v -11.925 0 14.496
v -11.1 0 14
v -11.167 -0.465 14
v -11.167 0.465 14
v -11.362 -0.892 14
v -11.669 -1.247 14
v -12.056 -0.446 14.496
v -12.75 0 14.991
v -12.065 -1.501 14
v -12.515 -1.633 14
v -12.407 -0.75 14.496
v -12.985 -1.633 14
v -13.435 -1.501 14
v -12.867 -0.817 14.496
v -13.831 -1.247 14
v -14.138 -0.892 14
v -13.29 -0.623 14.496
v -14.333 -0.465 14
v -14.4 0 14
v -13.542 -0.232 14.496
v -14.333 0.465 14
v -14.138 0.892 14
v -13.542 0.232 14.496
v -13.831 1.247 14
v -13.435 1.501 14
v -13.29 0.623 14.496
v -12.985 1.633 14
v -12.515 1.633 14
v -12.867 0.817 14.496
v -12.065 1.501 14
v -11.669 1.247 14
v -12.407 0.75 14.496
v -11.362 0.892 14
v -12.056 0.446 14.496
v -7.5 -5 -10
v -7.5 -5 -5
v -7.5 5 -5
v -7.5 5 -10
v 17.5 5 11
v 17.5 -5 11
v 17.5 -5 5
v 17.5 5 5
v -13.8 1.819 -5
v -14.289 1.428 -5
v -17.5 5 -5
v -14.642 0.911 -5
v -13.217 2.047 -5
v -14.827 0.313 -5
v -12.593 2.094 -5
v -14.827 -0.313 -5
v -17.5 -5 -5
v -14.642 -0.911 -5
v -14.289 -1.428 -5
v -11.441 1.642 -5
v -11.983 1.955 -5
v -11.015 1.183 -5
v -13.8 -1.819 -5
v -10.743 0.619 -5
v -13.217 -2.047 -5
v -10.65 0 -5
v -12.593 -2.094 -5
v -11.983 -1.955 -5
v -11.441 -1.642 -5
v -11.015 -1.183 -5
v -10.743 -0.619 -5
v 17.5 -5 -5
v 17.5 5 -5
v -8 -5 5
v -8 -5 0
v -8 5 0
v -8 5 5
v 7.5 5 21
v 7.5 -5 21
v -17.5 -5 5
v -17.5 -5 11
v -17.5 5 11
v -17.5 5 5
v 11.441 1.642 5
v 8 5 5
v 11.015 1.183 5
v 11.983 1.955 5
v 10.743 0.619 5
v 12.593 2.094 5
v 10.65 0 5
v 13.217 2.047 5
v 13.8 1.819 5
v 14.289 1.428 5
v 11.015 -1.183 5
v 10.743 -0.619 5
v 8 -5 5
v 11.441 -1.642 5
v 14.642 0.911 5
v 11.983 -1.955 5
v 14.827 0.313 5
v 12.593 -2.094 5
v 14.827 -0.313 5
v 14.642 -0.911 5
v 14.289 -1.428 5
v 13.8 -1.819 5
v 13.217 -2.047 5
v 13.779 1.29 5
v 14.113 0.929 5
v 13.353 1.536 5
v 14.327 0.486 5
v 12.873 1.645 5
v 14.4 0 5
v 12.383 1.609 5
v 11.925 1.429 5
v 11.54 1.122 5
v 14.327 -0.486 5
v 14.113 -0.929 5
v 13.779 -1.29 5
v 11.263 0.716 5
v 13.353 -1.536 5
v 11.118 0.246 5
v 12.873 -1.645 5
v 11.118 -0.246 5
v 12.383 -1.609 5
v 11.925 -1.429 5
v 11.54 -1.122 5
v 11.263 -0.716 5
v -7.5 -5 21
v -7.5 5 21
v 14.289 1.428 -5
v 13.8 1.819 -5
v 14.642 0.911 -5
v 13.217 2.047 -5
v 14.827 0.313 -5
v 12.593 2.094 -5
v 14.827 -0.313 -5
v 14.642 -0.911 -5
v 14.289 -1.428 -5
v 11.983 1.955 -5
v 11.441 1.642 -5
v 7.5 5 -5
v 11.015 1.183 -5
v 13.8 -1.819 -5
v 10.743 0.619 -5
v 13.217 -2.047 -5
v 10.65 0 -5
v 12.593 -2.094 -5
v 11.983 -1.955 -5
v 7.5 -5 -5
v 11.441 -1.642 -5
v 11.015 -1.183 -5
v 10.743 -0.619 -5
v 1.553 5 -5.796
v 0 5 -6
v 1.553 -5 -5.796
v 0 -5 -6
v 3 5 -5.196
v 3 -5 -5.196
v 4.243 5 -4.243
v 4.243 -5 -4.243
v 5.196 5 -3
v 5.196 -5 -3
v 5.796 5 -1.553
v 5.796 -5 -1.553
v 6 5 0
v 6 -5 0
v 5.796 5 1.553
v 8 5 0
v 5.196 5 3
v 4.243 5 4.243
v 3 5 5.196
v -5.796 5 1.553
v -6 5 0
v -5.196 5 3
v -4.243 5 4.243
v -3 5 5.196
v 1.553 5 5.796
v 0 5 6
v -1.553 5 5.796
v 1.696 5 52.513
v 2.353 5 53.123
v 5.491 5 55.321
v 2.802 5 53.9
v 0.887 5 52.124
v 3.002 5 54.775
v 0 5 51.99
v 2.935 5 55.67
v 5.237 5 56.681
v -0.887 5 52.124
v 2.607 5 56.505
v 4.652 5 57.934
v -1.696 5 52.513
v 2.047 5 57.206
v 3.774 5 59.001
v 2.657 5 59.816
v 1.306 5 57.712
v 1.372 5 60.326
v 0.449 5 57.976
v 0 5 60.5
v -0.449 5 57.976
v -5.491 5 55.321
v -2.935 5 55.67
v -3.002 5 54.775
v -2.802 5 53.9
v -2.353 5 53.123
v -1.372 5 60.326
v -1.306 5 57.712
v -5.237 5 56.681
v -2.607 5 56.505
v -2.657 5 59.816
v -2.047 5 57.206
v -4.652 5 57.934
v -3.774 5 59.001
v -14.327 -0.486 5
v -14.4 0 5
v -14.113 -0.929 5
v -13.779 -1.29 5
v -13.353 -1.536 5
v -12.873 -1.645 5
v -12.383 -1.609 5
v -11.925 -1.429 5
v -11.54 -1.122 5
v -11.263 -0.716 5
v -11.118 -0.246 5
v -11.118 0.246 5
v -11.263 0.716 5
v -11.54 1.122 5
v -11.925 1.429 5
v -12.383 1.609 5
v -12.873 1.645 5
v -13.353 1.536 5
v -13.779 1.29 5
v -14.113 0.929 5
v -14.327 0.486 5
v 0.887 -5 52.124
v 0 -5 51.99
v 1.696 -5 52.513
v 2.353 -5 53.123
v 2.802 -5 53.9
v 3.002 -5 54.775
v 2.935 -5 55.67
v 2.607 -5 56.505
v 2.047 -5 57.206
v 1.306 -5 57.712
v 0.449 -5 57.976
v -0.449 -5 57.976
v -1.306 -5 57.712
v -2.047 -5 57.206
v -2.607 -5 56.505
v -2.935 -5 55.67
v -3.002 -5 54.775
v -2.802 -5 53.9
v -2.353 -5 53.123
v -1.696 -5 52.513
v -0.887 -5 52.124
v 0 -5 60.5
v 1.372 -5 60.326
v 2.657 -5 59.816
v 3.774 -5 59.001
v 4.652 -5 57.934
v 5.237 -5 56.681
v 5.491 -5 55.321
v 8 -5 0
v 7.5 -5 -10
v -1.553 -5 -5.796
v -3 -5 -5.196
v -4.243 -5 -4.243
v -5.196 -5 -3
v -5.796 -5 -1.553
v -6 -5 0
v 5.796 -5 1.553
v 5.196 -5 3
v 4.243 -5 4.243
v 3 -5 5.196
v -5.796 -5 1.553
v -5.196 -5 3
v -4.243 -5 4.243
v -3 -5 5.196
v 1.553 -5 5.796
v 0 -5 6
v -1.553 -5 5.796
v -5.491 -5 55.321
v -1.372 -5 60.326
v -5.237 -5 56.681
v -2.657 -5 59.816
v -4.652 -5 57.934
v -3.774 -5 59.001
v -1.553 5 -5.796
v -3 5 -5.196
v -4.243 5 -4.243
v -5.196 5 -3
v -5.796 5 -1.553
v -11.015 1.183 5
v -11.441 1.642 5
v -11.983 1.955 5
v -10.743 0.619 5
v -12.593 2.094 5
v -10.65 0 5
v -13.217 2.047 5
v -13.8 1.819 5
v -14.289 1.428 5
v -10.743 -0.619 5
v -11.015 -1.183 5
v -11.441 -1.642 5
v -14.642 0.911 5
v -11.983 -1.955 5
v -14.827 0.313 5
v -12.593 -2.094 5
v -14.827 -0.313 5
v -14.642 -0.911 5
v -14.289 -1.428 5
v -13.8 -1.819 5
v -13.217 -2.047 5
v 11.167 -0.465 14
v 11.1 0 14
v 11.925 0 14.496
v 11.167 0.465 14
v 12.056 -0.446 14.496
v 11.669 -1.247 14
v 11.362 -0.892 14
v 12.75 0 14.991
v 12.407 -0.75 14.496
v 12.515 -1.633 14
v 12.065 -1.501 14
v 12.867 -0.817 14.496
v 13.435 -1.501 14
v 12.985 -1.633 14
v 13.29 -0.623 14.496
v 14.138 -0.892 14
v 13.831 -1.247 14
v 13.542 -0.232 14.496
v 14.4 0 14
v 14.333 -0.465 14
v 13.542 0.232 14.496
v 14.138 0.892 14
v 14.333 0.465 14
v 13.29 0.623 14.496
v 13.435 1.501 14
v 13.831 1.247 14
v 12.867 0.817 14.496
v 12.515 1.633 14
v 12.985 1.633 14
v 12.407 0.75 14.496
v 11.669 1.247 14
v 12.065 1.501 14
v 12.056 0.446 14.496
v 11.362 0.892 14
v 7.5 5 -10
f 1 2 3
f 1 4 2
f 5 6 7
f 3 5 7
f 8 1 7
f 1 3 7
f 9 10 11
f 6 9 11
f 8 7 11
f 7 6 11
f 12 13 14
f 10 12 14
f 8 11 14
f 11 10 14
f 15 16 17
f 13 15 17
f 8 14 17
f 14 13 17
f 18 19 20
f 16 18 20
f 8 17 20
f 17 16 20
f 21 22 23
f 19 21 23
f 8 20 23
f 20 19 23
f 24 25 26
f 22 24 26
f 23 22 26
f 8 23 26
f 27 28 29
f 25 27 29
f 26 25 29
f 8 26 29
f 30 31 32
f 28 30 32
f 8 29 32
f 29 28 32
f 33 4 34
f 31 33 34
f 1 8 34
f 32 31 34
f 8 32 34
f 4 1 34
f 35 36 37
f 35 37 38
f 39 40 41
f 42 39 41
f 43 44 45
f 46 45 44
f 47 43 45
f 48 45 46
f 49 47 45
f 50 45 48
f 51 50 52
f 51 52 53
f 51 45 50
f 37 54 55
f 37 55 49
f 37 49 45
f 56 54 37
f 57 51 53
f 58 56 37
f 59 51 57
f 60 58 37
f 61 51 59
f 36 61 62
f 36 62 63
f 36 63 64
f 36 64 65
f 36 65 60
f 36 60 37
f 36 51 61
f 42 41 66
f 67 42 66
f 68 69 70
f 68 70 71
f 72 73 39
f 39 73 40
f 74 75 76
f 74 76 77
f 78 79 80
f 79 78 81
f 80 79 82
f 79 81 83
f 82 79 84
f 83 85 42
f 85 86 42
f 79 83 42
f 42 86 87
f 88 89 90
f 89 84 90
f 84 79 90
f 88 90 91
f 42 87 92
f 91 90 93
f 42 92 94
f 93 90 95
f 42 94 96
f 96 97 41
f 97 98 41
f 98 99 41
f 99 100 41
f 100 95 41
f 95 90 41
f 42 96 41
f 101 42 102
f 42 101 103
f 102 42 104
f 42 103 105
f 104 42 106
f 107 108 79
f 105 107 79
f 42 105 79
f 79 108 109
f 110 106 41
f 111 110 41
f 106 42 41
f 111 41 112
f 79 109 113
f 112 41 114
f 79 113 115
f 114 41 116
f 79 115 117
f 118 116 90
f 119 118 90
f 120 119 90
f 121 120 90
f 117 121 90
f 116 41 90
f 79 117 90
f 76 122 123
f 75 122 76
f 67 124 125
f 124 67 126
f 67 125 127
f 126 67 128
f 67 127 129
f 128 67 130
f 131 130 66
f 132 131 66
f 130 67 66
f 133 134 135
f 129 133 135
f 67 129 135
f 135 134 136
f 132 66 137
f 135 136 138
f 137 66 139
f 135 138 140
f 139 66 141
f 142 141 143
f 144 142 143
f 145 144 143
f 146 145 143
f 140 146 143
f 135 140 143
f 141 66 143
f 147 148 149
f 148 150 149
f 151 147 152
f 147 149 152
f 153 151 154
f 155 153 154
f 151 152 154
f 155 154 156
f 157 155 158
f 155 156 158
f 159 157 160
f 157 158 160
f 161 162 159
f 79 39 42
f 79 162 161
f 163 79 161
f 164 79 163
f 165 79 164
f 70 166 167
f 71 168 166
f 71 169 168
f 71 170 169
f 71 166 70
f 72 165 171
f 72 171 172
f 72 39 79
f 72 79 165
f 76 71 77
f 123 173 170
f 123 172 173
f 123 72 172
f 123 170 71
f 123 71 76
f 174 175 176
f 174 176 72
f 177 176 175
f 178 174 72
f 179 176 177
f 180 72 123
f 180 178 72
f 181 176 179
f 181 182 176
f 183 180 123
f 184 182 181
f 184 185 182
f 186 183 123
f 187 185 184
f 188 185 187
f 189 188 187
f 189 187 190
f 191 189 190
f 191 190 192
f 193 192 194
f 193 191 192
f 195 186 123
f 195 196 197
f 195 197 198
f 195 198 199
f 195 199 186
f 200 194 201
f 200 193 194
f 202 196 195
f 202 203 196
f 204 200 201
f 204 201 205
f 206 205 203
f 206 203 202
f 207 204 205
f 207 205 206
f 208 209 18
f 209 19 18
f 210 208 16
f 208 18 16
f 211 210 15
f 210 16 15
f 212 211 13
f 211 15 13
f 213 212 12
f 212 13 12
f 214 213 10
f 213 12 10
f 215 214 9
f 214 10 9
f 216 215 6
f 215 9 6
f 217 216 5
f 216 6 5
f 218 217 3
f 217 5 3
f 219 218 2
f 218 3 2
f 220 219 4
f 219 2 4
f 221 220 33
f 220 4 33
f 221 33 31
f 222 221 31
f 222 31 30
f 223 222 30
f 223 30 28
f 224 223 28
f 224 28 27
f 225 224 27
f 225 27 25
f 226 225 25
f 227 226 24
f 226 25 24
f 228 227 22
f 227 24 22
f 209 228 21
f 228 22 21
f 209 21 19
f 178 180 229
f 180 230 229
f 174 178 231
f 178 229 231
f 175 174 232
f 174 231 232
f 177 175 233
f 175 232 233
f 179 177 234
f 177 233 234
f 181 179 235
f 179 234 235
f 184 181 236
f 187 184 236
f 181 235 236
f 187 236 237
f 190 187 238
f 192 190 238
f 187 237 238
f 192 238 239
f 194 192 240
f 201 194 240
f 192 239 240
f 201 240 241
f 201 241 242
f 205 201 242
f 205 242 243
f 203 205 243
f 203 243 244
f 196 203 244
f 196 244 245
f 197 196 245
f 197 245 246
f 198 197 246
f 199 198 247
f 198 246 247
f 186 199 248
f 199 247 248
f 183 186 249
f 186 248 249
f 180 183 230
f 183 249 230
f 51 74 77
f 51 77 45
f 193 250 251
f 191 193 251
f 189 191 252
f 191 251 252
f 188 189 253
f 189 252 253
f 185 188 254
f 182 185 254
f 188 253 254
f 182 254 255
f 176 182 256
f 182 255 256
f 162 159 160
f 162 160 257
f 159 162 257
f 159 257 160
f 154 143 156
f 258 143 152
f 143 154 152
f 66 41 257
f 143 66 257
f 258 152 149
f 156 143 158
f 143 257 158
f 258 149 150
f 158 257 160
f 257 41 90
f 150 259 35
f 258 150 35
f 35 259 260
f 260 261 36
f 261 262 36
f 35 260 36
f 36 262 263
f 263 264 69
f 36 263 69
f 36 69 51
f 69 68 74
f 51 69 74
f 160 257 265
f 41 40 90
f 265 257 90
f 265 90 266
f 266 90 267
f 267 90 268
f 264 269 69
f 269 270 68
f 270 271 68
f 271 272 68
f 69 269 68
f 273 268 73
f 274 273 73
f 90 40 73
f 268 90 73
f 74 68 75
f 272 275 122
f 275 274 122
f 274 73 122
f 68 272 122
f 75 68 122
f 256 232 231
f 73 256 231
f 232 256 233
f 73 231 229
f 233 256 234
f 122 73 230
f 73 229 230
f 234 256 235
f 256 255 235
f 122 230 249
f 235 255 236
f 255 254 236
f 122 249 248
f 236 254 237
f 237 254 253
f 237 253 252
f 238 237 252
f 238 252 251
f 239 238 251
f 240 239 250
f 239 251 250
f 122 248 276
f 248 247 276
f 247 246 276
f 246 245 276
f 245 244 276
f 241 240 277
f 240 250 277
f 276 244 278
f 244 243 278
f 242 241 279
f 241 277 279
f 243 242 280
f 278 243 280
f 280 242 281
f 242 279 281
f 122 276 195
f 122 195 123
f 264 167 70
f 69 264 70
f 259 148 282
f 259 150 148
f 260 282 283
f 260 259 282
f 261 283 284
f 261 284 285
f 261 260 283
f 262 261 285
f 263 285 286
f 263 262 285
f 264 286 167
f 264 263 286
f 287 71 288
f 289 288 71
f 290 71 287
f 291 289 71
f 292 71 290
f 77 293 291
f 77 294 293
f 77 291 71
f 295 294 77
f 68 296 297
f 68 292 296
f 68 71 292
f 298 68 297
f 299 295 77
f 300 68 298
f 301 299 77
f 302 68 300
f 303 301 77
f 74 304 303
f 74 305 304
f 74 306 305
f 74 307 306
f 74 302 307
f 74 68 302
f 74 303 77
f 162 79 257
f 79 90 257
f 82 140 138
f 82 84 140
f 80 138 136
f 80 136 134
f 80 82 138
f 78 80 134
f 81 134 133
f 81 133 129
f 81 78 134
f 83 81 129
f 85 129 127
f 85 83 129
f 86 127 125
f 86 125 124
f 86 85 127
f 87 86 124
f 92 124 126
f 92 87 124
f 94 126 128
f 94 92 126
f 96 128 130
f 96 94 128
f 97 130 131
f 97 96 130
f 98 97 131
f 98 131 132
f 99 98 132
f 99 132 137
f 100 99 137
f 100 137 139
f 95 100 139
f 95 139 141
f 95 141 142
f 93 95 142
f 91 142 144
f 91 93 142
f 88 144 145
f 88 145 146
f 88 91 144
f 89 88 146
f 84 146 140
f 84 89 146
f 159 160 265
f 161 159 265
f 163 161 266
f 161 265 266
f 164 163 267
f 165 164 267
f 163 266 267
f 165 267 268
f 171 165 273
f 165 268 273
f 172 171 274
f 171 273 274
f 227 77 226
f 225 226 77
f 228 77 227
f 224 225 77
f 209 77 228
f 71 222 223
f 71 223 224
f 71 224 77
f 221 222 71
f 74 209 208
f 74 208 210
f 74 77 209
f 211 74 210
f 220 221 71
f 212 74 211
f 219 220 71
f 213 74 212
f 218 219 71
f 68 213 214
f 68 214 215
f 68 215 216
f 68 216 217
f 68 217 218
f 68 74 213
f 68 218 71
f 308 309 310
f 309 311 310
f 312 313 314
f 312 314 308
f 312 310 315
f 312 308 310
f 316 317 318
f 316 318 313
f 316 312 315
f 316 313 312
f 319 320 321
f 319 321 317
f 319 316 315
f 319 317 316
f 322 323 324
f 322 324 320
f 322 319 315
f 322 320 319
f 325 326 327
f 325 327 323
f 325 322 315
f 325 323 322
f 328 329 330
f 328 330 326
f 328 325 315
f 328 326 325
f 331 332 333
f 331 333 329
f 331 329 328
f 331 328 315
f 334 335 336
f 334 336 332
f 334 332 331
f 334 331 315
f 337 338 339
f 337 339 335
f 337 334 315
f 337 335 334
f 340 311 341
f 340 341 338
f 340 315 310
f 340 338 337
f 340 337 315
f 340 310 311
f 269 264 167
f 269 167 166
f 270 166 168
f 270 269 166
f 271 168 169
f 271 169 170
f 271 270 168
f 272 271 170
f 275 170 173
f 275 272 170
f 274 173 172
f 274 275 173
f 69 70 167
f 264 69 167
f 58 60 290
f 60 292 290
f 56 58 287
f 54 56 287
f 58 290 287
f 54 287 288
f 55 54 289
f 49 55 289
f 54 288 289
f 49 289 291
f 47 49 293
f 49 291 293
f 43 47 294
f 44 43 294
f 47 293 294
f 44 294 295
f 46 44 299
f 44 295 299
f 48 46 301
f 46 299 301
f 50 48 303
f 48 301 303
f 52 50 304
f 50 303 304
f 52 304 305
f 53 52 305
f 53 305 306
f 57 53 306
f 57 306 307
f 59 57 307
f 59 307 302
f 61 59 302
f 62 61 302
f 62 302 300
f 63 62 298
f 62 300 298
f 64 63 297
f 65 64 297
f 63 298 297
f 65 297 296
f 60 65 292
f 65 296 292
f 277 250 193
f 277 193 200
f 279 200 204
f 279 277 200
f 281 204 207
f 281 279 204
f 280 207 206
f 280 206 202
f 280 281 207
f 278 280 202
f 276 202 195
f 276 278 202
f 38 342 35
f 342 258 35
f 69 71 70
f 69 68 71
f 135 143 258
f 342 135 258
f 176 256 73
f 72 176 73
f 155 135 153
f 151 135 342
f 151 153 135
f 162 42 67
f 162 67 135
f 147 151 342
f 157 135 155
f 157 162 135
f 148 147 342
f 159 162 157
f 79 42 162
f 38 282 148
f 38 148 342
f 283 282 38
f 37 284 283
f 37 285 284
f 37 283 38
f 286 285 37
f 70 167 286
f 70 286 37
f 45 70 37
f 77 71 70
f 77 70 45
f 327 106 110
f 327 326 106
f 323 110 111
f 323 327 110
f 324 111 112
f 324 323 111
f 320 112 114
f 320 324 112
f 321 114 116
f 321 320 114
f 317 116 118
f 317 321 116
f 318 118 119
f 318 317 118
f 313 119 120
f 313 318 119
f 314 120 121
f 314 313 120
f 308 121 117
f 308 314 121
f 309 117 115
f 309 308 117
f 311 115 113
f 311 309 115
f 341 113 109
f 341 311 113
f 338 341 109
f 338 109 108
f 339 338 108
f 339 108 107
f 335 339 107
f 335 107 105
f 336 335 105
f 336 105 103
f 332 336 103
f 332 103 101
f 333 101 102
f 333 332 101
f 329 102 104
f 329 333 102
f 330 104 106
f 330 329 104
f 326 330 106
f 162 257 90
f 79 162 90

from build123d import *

# Parameters (mm, degrees)
F1_DEPTH      = 5
F2_R          = 2.1
F3_DEPTH      = 12.5
F6_DEPTH      = 5
F6_DEPTH_BACK = 5
F8_D          = 3.3
F8_DEPTH      = 9
F8_TIP        = 0.9914200214


with BuildPart() as f1:
    # F0 (on Front) → F1 (new body, symmetric)
    with BuildSketch(Plane.XZ):
        with BuildLine():
            ThreePointArc((0, -6), (-4.2426406871, -4.2426406871), (-6, 0))
            Line((-6, 0), (-8, 0))
            Line((-8, 0), (-8, 5))
            Line((-8, 5), (-17.5, 5))
            Line((-17.5, 5), (-17.5, -5))
            Line((-17.5, -5), (-7.5, -5))
            Line((-7.5, -5), (-7.5, -10))
            Line((-7.5, -10), (0, -10))
            Line((0, -10), (0, -6))
        make_face()
    extrude(amount=F1_DEPTH, both=True)

    # F2 (on Top) → F3 (cut, symmetric)
    with BuildSketch(Plane.XY):
        with Locations((-12.75, 0)):
            Circle(F2_R)
    extrude(amount=F3_DEPTH, both=True, mode=Mode.SUBTRACT)

    # F4: F1 across plane


with BuildPart() as f1_1:
    add(f1.part)
    add(f1.part.mirror(Plane.YZ))


with BuildPart() as f6:
    # F5 (on Front) → F6 (new body, two sides)
    with BuildSketch(Plane.XZ) as f6_sk:
        with BuildLine():
            Line((-8, 0), (-6, 0))
            ThreePointArc((-6, 0), (-4.2426406871, 4.2426406871), (0, 6))
            Line((0, 6), (0, 51.99))
            ThreePointArc((0, 51.99), (-3.01, 55), (0, 58.01))
            Line((0, 58.01), (0, 60.5))
            ThreePointArc((0, 60.5), (-3.7737246239, 59.0011251497), (-5.4905980002, 55.3214554412))
            Line((-5.4905980002, 55.3214554412), (-7.5, 21))
            Line((-7.5, 21), (-17.5, 11))
            Line((-17.5, 11), (-17.5, 5))
            Line((-17.5, 5), (-8, 5))
            Line((-8, 5), (-8, 0))
        make_face()
    extrude(amount=F6_DEPTH)
    extrude(f6_sk.sketch, amount=-F6_DEPTH_BACK)

    # F8
    with Locations(Plane(origin=(0, 0, 5), x_dir=(1, 0, 0), z_dir=(0, 0, -1))):
        with Locations((-12.75, 0)):
            Hole(F8_D / 2, depth=F8_DEPTH)
            with Locations((0, 0, -(F8_DEPTH + F8_TIP / 2))):  # 118° drill point
                Cone(0, F8_D / 2, F8_TIP, mode=Mode.SUBTRACT)

    # F9: F6 across plane


with BuildPart() as f6_1:
    add(f6.part)
    add(f6.part.mirror(Plane.YZ))


solid = Compound([f1_1.part, f6_1.part])
